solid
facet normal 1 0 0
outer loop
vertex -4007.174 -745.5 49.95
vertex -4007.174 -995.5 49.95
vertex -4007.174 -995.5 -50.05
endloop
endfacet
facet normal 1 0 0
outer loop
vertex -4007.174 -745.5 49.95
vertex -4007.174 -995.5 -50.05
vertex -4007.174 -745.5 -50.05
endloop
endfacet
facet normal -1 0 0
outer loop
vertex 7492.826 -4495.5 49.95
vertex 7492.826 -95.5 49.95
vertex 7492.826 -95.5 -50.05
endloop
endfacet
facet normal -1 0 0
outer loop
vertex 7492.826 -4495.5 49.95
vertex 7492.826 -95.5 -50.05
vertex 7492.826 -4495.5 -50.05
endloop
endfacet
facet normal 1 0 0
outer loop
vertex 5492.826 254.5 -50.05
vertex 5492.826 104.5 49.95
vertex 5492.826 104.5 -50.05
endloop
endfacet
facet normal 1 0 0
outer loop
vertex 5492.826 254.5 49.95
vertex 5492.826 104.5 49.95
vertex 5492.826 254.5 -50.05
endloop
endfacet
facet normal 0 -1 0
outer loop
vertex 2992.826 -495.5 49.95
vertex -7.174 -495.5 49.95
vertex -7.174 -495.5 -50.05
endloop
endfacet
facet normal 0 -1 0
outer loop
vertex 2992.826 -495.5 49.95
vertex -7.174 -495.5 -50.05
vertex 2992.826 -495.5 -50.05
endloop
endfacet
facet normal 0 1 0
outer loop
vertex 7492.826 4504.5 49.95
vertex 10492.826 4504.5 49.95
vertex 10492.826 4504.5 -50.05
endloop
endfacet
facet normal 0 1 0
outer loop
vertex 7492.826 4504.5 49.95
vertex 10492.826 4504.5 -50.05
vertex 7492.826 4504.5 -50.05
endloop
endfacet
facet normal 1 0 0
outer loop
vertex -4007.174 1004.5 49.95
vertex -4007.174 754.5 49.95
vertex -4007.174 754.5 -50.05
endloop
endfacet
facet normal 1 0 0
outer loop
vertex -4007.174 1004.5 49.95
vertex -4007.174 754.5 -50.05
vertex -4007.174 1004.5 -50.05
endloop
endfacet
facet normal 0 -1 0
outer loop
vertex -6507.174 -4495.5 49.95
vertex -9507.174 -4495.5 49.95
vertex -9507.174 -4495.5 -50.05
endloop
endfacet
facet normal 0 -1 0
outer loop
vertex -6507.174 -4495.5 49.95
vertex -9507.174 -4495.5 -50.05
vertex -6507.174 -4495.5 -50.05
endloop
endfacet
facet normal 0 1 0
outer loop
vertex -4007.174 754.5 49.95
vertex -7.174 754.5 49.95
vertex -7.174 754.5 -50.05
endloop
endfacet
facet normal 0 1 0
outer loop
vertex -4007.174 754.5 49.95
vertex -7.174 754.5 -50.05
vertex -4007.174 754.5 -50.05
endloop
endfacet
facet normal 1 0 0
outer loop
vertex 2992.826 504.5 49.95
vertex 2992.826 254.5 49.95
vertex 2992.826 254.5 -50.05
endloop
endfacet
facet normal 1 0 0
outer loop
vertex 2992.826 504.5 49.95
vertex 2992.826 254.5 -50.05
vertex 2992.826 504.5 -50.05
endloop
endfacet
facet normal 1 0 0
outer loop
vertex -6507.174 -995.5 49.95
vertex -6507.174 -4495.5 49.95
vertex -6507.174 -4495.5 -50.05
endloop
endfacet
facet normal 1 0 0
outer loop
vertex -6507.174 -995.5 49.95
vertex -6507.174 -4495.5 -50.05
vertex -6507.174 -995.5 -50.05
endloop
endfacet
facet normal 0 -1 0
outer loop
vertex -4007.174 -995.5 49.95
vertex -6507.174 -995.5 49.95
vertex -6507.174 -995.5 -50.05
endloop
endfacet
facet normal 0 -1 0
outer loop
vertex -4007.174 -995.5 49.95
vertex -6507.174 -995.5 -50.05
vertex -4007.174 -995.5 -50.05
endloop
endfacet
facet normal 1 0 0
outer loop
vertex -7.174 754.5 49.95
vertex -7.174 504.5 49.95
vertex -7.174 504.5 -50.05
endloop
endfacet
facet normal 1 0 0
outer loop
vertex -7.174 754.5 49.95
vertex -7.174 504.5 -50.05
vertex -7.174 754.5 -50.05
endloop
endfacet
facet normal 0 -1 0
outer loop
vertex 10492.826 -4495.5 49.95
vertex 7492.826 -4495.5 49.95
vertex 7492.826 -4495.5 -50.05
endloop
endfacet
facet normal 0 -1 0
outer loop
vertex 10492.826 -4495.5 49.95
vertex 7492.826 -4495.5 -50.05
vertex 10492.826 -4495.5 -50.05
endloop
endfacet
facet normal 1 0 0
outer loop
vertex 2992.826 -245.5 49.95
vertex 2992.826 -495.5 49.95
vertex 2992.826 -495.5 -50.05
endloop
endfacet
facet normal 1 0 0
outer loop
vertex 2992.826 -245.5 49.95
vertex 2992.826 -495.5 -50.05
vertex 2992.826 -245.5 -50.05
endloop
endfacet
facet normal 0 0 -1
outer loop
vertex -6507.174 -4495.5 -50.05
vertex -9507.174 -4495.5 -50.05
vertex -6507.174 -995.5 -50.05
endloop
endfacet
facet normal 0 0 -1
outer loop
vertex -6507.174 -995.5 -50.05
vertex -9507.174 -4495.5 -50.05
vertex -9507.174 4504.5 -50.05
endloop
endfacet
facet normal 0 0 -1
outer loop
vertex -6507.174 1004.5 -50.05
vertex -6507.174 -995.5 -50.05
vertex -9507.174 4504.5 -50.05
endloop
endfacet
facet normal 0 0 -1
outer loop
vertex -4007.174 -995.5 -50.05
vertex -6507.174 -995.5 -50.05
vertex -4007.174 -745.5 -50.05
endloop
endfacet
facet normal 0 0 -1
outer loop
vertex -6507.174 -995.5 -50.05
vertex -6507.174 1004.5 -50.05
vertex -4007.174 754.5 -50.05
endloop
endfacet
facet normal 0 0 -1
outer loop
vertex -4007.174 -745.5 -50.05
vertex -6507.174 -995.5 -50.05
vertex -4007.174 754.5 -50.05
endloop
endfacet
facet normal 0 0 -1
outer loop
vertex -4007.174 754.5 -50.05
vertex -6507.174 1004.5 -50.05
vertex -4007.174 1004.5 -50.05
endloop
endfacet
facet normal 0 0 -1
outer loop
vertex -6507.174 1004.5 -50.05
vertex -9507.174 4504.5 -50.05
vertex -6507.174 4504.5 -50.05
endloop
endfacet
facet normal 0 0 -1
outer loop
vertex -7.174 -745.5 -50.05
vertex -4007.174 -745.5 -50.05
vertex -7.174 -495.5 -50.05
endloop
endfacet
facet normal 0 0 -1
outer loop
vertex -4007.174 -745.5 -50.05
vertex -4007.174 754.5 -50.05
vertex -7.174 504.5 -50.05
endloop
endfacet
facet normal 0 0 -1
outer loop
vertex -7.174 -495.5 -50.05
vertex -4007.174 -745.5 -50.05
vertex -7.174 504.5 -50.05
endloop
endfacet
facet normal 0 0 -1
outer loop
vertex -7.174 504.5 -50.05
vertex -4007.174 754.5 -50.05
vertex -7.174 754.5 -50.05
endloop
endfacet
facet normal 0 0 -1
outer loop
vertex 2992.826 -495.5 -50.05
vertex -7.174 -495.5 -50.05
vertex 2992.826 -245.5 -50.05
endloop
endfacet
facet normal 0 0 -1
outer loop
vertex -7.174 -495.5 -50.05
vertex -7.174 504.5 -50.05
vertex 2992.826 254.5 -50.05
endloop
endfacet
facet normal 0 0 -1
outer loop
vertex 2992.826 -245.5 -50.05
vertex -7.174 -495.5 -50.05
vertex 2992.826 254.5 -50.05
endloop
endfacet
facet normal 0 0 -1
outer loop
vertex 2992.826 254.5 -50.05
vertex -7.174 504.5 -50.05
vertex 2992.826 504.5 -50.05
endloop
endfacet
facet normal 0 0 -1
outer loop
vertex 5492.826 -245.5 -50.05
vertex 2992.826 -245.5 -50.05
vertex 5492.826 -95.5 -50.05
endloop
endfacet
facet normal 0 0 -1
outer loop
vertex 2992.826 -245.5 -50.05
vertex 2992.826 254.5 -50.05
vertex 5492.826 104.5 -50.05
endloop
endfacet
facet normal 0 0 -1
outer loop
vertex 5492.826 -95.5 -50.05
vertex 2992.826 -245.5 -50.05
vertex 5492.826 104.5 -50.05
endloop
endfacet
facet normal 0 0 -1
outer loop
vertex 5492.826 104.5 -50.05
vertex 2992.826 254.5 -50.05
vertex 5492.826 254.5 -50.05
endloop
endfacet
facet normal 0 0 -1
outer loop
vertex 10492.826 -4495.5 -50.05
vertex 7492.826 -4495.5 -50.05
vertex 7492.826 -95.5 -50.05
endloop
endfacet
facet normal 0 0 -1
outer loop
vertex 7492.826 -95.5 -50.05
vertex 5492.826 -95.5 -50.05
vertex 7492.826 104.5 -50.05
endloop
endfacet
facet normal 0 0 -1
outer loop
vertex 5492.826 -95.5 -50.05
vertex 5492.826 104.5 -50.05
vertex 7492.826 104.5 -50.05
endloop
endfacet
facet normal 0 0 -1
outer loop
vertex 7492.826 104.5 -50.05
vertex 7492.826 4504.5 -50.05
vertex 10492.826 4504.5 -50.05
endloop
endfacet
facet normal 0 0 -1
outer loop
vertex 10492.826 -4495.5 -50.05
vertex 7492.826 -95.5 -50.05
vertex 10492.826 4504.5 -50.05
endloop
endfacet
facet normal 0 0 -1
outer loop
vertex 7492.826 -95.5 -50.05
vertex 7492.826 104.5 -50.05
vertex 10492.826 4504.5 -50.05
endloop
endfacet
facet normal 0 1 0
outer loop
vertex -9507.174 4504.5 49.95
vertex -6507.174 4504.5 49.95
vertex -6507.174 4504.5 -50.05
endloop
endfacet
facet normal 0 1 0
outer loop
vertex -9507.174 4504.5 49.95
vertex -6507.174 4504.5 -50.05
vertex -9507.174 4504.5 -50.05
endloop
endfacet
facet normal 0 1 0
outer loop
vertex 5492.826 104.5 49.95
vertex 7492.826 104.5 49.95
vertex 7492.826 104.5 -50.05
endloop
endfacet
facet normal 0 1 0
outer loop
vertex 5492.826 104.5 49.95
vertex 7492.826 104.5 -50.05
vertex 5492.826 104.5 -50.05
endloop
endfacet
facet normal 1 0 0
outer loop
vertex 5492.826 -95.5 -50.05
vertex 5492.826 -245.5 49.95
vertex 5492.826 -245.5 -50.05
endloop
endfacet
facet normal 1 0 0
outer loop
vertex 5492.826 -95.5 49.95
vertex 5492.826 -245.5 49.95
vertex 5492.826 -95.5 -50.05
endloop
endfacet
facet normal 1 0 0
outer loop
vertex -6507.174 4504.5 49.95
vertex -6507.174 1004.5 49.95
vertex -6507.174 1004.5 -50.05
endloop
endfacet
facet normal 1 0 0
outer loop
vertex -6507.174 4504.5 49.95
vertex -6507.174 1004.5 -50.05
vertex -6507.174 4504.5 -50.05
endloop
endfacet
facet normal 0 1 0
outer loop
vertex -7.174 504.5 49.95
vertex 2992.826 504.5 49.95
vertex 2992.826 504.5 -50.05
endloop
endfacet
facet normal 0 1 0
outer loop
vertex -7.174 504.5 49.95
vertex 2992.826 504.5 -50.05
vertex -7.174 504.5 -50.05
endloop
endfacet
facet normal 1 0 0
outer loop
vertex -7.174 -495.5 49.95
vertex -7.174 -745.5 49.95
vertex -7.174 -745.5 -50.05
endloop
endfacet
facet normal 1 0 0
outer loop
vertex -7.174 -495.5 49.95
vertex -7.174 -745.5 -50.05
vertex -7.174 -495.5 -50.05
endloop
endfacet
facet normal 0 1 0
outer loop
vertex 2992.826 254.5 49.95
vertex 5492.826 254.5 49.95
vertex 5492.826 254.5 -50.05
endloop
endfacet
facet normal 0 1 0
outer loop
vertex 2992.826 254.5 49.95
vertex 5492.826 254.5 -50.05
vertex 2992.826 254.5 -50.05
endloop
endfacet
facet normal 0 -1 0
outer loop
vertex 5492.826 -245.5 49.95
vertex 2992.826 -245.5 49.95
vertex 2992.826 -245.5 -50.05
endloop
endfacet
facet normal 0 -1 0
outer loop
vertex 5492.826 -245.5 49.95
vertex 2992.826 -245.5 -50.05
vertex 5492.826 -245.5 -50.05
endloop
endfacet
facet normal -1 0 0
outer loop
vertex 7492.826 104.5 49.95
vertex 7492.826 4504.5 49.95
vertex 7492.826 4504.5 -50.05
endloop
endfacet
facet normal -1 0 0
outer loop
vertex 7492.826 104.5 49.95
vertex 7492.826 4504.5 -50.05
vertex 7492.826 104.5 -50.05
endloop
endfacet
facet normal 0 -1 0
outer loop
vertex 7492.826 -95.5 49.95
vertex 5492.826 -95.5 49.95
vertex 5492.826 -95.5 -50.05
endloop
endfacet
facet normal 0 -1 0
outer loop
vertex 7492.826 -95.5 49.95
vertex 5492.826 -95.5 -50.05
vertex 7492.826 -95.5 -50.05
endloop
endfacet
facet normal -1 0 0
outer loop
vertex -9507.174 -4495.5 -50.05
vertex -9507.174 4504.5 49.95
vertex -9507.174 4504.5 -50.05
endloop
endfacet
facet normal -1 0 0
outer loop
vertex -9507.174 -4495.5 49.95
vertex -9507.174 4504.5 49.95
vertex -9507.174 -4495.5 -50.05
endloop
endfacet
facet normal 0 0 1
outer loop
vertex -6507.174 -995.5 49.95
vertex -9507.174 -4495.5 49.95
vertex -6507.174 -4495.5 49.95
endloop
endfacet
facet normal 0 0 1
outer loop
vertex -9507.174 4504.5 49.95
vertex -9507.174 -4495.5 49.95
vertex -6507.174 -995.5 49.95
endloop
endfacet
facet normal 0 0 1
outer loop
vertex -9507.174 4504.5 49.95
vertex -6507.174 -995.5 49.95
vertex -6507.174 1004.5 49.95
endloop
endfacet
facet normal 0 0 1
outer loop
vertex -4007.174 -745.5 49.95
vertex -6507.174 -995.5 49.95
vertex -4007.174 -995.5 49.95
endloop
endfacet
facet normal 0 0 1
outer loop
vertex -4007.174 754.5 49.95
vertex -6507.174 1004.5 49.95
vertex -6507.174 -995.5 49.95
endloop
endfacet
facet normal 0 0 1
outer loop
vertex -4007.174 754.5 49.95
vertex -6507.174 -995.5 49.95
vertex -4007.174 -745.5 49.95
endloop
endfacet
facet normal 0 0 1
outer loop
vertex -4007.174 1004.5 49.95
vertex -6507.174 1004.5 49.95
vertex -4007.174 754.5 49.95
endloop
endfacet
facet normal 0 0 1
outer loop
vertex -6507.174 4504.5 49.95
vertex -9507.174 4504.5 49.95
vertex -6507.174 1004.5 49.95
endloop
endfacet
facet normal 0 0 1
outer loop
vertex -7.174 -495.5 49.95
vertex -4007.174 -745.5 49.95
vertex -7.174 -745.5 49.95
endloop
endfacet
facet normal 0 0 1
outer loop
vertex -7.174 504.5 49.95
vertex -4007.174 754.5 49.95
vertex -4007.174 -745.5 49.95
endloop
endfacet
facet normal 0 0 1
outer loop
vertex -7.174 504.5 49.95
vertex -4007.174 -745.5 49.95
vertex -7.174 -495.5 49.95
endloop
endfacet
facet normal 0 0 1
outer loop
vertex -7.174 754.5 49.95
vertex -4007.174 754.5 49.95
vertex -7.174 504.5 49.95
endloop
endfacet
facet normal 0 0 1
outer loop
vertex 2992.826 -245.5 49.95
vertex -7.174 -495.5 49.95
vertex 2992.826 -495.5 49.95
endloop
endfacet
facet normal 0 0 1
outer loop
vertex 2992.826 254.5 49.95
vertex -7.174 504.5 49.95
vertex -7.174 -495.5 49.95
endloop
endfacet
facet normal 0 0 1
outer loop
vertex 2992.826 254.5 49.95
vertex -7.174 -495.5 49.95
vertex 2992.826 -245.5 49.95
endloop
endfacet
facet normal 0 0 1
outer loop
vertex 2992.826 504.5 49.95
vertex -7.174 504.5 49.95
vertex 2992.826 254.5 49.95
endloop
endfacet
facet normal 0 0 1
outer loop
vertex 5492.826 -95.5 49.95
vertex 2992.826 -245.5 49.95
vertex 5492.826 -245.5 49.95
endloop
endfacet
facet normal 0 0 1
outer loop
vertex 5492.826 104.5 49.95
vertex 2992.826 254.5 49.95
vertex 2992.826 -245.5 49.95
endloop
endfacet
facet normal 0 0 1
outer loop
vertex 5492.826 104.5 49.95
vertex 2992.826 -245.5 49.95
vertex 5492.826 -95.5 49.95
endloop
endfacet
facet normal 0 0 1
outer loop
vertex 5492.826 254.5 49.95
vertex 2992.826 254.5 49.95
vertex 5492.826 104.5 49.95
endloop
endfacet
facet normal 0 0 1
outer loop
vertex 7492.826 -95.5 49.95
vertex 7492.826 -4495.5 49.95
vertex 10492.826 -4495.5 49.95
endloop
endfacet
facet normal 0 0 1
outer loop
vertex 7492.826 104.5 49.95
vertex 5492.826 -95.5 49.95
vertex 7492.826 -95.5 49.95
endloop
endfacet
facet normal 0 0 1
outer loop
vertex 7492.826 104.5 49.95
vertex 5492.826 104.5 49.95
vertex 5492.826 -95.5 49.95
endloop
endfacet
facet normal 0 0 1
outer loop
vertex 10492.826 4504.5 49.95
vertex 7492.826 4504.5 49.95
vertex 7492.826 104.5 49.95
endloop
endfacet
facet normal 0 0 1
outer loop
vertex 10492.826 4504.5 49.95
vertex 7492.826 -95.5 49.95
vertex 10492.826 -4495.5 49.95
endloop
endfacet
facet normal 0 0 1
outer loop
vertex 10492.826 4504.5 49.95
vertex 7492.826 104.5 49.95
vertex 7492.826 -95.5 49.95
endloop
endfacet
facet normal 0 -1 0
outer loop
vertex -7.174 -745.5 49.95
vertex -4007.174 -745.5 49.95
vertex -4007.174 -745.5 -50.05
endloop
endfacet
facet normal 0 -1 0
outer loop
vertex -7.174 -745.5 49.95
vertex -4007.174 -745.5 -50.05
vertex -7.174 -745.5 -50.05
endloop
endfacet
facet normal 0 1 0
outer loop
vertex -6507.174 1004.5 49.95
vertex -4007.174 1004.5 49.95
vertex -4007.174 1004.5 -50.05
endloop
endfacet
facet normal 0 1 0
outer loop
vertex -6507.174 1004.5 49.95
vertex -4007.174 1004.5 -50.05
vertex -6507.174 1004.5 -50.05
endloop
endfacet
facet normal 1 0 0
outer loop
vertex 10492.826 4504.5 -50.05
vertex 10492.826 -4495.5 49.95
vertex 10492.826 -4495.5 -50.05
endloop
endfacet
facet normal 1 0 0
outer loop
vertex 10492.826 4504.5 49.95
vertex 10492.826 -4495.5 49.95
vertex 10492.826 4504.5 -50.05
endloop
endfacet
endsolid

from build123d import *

# Parameters (mm, degrees)
BOSS_EXTRUDE1_DEPTH = 0.1
SCALE1_SCALE        = 1000


with BuildPart() as part:
    # Sketch2 → Boss-Extrude1 (new body)
    with BuildSketch(Plane.XY):
        Polygon((0, 0), (3, 0), (3, 3.5), (5.5, 3.5), (5.5, 3.75), (9.5, 3.75), (9.5, 4), (12.5, 4), (12.5, 4.25), (15, 4.25), (15, 4.4), (17, 4.4), (17, 0), (20, 0), (20, 9), (17, 9), (17, 4.6), (15, 4.6), (15, 4.75), (12.5, 4.75), (12.5, 5), (9.5, 5), (9.5, 5.25), (5.5, 5.25), (5.5, 5.5), (3, 5.5), (3, 9), (0, 9), align=None)
    extrude(amount=-BOSS_EXTRUDE1_DEPTH)


with BuildPart() as part_1:
    # Scale1: scaled about (9.516690596, 4.5, -0.05)
    add(part.part.scale(SCALE1_SCALE).moved(Location((-9507.173905404, -4495.5, 49.95))))


solid = part_1.part
